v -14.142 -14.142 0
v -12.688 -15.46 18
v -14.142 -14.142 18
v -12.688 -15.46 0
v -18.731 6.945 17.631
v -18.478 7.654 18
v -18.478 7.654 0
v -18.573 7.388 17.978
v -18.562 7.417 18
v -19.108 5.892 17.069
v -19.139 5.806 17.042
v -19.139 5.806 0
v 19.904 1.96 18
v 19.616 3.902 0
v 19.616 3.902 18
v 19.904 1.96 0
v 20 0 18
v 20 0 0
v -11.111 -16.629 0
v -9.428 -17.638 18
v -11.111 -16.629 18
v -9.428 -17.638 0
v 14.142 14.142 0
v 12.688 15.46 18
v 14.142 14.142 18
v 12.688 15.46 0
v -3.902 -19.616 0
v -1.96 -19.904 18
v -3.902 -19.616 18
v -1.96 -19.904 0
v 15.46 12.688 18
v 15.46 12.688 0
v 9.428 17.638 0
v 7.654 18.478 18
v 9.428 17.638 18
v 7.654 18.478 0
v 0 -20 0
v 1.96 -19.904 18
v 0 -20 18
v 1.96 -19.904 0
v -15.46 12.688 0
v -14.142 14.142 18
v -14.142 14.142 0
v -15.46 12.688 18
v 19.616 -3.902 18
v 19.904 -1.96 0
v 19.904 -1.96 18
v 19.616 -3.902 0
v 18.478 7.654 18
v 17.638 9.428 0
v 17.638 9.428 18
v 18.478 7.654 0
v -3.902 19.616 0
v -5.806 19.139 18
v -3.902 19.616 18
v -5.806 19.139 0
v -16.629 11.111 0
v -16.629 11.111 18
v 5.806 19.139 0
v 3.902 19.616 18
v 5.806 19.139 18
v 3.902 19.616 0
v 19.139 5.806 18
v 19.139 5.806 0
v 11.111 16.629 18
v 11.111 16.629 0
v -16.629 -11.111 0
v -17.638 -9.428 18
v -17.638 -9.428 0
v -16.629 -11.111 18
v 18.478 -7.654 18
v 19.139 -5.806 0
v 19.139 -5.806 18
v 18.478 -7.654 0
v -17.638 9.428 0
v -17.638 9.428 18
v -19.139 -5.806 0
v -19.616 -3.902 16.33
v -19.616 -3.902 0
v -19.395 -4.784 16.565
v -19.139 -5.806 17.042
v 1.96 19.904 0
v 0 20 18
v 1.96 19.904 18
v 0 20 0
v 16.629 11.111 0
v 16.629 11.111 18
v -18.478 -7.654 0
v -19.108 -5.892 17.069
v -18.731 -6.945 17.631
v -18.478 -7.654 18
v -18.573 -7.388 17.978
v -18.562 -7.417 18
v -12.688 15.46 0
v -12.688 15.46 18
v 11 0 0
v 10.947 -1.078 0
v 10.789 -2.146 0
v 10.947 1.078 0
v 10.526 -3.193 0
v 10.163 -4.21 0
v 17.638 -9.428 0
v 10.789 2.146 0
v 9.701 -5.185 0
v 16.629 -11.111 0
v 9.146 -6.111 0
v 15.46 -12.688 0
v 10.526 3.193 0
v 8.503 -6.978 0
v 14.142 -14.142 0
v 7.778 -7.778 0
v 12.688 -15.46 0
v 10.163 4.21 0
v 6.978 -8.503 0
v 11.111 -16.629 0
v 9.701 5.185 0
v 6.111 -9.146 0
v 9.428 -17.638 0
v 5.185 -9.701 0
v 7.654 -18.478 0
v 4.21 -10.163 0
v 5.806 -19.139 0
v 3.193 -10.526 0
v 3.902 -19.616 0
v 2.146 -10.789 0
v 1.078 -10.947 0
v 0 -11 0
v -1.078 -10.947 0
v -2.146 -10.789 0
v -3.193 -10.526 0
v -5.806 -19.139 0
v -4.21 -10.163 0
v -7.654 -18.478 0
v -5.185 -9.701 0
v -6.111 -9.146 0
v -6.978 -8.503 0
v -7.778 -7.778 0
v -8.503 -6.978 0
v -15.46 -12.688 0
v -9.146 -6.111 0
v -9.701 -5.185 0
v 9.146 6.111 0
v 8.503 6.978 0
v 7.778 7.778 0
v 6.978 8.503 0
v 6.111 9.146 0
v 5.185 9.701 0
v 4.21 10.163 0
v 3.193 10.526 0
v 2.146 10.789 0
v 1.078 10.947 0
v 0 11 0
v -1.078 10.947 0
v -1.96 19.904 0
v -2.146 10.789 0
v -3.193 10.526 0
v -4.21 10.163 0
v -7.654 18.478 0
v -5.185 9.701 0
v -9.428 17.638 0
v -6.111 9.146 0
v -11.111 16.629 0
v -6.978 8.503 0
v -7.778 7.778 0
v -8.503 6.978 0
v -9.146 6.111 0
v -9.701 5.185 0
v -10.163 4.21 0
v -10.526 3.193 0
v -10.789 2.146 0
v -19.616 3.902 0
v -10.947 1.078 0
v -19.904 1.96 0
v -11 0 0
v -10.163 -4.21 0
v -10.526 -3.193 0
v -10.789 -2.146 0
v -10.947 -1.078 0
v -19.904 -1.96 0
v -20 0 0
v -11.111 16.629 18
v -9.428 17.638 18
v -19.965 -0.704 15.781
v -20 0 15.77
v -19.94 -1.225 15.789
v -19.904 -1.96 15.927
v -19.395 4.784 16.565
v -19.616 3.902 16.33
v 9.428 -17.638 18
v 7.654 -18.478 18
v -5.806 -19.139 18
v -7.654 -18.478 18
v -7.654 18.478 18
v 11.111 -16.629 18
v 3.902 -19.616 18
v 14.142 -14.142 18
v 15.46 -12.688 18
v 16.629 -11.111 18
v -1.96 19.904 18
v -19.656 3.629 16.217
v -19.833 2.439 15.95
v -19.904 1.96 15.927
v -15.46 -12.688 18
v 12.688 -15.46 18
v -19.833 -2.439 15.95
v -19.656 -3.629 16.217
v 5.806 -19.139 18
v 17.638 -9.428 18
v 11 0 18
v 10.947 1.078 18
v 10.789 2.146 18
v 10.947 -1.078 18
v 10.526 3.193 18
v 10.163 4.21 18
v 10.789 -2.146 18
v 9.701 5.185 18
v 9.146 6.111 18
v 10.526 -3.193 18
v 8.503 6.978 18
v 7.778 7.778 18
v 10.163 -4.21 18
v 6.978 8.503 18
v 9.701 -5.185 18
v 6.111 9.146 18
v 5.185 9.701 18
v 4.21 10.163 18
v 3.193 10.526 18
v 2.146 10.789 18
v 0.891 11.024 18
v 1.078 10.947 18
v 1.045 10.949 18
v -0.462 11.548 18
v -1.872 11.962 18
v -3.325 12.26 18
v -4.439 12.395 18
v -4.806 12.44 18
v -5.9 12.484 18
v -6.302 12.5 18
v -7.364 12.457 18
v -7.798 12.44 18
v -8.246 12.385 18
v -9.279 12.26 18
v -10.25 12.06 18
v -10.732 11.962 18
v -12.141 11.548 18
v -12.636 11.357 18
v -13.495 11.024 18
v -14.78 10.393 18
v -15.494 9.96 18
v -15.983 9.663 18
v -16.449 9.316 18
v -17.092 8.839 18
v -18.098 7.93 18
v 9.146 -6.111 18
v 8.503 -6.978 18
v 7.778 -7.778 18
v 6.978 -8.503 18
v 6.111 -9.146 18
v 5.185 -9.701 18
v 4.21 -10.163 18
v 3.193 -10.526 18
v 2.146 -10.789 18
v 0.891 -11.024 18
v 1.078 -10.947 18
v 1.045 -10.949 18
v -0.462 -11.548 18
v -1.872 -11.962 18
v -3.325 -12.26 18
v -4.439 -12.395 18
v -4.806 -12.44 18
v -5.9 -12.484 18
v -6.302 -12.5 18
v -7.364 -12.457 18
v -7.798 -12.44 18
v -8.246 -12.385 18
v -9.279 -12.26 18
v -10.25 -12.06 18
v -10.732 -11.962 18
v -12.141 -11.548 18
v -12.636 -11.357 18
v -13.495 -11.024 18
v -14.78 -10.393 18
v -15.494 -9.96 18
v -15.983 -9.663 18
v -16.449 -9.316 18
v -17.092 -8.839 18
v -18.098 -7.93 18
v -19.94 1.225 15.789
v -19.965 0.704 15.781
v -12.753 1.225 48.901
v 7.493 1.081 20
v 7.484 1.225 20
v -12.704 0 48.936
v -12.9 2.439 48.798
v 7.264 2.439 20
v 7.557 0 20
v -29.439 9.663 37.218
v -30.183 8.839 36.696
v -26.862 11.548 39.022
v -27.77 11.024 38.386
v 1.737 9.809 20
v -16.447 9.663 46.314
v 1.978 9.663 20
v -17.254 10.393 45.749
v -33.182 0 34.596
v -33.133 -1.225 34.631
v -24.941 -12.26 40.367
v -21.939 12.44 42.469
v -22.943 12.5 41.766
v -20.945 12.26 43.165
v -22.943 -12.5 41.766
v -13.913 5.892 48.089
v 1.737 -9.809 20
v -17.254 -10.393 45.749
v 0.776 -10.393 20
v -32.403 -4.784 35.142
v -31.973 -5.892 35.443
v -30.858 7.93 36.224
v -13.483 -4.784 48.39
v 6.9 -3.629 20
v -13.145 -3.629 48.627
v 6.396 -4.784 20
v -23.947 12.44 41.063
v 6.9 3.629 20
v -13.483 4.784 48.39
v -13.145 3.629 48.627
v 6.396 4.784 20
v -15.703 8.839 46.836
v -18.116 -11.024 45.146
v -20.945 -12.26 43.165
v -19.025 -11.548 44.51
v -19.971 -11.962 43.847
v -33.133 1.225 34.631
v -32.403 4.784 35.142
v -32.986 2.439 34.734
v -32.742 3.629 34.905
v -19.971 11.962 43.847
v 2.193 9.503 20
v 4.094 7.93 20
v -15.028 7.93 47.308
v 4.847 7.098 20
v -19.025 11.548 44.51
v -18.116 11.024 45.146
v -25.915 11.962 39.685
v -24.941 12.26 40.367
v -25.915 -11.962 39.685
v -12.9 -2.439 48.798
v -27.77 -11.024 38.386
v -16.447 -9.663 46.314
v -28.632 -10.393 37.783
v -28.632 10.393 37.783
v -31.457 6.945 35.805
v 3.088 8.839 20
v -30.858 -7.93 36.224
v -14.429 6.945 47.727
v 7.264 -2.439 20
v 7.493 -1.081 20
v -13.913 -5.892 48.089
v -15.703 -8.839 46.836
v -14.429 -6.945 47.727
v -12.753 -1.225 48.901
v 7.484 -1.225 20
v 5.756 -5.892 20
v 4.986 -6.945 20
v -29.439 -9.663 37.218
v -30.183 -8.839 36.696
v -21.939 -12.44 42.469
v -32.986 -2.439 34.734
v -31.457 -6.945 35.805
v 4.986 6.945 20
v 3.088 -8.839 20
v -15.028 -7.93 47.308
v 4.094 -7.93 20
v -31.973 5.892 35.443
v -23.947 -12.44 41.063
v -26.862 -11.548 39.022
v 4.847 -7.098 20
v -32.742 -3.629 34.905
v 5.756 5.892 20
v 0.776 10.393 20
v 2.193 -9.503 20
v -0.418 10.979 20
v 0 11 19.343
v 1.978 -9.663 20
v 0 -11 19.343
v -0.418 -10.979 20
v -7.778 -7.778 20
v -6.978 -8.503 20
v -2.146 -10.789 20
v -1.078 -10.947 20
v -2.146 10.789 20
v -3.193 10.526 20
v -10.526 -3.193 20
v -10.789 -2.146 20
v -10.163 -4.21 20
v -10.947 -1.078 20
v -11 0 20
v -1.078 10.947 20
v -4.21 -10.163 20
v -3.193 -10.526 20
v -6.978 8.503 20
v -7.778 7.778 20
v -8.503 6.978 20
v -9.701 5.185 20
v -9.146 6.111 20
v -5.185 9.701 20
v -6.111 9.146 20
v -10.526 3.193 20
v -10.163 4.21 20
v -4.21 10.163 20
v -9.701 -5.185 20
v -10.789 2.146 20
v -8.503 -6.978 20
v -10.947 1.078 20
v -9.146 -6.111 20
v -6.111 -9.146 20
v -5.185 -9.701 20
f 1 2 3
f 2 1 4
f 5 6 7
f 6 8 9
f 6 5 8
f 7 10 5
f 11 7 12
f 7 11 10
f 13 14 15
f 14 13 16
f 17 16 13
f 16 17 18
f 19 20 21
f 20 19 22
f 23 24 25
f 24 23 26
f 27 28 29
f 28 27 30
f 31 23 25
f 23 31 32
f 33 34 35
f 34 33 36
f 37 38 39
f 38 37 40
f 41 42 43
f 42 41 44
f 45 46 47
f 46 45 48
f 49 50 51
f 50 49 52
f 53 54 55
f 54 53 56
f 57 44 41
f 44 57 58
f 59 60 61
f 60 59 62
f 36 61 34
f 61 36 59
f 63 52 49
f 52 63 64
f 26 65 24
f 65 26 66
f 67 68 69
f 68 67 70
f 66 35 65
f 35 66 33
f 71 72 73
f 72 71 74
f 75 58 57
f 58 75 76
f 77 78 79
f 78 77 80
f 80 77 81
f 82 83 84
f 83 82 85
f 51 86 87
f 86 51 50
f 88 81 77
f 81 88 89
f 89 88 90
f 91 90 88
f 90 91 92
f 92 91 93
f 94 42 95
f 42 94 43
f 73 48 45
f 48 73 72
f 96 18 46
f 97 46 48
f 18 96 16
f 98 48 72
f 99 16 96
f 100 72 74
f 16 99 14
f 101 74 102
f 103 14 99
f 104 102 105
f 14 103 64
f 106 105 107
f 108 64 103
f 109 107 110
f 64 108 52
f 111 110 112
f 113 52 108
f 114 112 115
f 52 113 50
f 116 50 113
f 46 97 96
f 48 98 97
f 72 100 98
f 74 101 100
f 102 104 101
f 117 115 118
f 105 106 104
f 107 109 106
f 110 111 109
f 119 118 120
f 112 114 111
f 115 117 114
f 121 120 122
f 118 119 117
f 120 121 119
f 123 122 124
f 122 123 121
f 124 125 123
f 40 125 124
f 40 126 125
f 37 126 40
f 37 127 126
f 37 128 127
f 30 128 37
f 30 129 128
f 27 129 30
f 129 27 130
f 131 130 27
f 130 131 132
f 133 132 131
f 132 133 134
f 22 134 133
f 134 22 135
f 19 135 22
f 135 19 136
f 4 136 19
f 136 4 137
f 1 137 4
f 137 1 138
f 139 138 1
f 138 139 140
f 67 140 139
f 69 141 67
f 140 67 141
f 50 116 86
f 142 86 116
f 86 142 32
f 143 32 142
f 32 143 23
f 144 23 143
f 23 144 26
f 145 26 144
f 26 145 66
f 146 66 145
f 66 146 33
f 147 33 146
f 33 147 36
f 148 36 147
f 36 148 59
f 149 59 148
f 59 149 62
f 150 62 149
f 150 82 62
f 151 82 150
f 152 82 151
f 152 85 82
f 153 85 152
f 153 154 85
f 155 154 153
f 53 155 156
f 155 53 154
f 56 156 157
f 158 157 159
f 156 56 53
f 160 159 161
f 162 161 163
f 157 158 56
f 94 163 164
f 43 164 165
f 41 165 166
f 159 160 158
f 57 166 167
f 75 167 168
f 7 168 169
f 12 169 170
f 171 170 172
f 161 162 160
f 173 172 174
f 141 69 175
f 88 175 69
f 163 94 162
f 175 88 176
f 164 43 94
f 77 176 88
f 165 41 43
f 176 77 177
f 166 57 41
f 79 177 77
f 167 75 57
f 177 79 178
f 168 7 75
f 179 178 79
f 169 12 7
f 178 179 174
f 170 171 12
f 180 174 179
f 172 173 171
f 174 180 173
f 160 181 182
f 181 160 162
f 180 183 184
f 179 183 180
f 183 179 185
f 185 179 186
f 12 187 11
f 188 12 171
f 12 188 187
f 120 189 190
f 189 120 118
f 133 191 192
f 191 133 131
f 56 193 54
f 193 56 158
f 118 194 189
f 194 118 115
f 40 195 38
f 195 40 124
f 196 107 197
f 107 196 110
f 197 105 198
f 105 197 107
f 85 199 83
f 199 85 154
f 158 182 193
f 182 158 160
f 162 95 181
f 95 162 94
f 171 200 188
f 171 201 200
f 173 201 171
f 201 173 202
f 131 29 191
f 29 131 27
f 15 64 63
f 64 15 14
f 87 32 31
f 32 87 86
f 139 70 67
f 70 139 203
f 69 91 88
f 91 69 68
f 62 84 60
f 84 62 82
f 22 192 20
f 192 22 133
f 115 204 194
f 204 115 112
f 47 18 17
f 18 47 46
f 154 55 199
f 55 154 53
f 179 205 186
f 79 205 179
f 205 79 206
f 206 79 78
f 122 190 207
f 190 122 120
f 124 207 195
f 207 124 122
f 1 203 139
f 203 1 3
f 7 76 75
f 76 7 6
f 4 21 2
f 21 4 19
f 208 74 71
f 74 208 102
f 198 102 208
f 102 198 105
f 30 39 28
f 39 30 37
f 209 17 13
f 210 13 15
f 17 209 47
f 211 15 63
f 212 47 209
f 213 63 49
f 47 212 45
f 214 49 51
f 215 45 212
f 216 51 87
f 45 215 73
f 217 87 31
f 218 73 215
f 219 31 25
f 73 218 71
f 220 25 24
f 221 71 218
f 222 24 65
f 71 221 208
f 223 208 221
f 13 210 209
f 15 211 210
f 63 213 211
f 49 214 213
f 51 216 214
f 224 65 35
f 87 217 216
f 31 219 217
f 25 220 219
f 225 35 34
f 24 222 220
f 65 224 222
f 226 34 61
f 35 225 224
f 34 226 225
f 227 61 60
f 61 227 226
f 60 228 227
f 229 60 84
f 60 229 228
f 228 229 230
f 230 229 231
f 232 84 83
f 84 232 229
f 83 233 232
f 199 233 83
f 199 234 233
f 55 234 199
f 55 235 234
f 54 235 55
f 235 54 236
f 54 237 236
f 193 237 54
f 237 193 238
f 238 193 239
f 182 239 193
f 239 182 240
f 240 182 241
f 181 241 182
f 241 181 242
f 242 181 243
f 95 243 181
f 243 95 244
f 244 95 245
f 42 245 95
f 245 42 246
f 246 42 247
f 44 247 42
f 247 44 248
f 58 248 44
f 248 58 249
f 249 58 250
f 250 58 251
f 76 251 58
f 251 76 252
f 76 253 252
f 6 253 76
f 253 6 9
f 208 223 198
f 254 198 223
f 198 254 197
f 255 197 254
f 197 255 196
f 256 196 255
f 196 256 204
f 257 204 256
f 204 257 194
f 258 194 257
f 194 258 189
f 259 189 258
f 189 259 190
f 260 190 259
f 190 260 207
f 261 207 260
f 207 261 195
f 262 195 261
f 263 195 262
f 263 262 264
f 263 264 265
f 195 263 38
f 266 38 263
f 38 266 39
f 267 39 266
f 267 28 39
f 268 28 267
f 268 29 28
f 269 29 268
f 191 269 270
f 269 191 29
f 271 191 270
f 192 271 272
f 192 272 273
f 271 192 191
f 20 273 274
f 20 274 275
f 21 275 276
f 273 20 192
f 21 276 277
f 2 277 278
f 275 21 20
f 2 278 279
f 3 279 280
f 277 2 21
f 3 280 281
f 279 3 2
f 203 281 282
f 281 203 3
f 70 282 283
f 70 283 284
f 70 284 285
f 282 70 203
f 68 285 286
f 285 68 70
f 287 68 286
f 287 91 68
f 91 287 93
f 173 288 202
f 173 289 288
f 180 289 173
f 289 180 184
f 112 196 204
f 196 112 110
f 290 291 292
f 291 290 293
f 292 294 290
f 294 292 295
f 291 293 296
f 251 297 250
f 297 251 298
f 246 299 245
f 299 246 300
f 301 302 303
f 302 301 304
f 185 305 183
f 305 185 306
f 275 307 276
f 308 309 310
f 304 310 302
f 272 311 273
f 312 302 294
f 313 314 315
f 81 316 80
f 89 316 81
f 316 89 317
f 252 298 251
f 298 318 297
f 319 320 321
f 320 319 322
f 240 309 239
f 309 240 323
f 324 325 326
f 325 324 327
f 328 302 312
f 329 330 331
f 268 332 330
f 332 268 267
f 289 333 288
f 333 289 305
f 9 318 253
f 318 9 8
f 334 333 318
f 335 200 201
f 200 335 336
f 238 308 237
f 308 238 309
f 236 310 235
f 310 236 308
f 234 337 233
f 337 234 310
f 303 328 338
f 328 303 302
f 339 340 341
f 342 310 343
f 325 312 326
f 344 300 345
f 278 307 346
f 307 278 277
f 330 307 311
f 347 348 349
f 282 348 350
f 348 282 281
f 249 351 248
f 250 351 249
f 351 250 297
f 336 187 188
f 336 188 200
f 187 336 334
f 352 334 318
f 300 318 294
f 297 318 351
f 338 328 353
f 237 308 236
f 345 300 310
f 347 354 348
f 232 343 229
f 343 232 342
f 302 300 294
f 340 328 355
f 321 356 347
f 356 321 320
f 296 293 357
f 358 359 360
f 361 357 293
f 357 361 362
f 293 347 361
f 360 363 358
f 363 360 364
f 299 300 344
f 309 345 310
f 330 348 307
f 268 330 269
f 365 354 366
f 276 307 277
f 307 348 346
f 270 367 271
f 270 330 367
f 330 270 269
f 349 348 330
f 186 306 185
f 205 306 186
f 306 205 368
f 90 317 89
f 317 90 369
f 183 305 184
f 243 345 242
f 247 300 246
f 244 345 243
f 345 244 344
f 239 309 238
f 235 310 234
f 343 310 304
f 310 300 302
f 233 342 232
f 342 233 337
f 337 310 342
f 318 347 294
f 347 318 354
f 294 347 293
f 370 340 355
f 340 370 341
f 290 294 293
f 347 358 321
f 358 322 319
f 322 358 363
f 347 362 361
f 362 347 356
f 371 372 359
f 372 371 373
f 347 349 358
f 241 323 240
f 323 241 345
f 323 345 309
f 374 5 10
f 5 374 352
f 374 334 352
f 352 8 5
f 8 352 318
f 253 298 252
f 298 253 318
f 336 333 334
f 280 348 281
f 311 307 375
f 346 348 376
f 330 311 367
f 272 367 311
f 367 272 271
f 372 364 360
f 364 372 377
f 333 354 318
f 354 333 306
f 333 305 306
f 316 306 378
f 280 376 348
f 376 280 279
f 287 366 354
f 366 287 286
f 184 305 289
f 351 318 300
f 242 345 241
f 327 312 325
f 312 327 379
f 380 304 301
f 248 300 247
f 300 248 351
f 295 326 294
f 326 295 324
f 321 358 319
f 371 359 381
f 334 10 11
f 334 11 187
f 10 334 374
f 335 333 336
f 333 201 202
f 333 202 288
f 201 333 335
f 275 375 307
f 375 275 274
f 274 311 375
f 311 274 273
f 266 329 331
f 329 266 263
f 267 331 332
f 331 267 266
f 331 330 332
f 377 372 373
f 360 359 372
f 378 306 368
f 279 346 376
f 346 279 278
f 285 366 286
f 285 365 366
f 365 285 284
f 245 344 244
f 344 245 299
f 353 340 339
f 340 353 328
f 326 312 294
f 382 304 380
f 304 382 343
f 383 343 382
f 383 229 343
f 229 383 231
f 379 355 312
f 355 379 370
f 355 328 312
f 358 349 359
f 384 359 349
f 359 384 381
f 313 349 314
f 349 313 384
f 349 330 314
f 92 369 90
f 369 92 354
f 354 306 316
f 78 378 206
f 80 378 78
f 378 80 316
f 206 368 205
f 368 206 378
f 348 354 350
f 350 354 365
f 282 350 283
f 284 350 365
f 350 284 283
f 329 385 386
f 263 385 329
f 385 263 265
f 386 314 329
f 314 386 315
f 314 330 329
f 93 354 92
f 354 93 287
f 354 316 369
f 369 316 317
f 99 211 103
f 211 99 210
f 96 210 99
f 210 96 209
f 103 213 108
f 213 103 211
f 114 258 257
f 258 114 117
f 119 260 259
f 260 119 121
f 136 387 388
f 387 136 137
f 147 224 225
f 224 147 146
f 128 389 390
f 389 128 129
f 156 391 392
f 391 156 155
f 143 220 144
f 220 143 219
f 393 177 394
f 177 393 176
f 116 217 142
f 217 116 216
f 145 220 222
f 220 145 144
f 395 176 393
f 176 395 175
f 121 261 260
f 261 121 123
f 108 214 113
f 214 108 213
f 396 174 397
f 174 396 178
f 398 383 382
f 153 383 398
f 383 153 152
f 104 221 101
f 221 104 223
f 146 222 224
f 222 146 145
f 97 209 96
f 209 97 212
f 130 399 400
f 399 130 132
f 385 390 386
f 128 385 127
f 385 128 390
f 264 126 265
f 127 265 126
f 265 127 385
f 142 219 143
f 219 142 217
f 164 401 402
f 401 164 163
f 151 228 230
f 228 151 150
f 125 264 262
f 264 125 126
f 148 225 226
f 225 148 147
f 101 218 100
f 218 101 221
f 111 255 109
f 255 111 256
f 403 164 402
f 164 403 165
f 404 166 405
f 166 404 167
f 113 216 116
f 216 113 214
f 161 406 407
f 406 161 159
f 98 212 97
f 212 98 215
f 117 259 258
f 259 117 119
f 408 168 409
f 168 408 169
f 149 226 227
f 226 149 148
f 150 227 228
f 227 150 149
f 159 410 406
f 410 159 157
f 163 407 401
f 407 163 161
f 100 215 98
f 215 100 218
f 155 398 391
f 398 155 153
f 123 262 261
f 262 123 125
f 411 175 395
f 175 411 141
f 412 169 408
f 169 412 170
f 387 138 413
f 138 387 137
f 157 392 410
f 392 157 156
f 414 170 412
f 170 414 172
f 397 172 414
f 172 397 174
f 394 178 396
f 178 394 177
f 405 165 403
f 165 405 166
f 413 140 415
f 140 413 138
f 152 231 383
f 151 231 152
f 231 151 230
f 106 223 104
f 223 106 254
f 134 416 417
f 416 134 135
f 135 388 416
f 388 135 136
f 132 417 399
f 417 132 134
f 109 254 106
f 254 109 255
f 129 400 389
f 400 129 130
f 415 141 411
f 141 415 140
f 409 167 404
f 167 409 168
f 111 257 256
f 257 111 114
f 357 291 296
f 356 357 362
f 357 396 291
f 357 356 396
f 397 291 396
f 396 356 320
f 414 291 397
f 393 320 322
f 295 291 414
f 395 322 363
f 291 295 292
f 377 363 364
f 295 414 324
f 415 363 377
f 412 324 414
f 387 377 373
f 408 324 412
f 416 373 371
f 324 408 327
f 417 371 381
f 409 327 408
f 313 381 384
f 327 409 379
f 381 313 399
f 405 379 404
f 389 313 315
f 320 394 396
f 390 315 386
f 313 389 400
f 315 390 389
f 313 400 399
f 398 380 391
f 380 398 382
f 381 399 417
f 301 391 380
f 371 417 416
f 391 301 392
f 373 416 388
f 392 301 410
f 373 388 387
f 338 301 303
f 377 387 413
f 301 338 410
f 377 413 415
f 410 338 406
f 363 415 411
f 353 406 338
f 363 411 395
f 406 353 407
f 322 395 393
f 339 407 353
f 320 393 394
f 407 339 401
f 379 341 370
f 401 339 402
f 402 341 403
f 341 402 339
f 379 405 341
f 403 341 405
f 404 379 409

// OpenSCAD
collar_od=40; collar_id=22; collar_h=18; stub_od=25; stub_h=40; angle=-35;
module adapter(){ difference(){ translate([0,0,0]) union(){ cylinder(h=collar_h,r=collar_od/2,$fn=64); translate([0,0,collar_h/2]) rotate([0,angle,0]) translate([0,0,0]) cylinder(h=stub_h,r=stub_od/2,$fn=64); } translate([0,0,0]) translate([0,0,0]) cylinder(h=collar_h+2,r=collar_id/2,$fn=64); } }
adapter();
